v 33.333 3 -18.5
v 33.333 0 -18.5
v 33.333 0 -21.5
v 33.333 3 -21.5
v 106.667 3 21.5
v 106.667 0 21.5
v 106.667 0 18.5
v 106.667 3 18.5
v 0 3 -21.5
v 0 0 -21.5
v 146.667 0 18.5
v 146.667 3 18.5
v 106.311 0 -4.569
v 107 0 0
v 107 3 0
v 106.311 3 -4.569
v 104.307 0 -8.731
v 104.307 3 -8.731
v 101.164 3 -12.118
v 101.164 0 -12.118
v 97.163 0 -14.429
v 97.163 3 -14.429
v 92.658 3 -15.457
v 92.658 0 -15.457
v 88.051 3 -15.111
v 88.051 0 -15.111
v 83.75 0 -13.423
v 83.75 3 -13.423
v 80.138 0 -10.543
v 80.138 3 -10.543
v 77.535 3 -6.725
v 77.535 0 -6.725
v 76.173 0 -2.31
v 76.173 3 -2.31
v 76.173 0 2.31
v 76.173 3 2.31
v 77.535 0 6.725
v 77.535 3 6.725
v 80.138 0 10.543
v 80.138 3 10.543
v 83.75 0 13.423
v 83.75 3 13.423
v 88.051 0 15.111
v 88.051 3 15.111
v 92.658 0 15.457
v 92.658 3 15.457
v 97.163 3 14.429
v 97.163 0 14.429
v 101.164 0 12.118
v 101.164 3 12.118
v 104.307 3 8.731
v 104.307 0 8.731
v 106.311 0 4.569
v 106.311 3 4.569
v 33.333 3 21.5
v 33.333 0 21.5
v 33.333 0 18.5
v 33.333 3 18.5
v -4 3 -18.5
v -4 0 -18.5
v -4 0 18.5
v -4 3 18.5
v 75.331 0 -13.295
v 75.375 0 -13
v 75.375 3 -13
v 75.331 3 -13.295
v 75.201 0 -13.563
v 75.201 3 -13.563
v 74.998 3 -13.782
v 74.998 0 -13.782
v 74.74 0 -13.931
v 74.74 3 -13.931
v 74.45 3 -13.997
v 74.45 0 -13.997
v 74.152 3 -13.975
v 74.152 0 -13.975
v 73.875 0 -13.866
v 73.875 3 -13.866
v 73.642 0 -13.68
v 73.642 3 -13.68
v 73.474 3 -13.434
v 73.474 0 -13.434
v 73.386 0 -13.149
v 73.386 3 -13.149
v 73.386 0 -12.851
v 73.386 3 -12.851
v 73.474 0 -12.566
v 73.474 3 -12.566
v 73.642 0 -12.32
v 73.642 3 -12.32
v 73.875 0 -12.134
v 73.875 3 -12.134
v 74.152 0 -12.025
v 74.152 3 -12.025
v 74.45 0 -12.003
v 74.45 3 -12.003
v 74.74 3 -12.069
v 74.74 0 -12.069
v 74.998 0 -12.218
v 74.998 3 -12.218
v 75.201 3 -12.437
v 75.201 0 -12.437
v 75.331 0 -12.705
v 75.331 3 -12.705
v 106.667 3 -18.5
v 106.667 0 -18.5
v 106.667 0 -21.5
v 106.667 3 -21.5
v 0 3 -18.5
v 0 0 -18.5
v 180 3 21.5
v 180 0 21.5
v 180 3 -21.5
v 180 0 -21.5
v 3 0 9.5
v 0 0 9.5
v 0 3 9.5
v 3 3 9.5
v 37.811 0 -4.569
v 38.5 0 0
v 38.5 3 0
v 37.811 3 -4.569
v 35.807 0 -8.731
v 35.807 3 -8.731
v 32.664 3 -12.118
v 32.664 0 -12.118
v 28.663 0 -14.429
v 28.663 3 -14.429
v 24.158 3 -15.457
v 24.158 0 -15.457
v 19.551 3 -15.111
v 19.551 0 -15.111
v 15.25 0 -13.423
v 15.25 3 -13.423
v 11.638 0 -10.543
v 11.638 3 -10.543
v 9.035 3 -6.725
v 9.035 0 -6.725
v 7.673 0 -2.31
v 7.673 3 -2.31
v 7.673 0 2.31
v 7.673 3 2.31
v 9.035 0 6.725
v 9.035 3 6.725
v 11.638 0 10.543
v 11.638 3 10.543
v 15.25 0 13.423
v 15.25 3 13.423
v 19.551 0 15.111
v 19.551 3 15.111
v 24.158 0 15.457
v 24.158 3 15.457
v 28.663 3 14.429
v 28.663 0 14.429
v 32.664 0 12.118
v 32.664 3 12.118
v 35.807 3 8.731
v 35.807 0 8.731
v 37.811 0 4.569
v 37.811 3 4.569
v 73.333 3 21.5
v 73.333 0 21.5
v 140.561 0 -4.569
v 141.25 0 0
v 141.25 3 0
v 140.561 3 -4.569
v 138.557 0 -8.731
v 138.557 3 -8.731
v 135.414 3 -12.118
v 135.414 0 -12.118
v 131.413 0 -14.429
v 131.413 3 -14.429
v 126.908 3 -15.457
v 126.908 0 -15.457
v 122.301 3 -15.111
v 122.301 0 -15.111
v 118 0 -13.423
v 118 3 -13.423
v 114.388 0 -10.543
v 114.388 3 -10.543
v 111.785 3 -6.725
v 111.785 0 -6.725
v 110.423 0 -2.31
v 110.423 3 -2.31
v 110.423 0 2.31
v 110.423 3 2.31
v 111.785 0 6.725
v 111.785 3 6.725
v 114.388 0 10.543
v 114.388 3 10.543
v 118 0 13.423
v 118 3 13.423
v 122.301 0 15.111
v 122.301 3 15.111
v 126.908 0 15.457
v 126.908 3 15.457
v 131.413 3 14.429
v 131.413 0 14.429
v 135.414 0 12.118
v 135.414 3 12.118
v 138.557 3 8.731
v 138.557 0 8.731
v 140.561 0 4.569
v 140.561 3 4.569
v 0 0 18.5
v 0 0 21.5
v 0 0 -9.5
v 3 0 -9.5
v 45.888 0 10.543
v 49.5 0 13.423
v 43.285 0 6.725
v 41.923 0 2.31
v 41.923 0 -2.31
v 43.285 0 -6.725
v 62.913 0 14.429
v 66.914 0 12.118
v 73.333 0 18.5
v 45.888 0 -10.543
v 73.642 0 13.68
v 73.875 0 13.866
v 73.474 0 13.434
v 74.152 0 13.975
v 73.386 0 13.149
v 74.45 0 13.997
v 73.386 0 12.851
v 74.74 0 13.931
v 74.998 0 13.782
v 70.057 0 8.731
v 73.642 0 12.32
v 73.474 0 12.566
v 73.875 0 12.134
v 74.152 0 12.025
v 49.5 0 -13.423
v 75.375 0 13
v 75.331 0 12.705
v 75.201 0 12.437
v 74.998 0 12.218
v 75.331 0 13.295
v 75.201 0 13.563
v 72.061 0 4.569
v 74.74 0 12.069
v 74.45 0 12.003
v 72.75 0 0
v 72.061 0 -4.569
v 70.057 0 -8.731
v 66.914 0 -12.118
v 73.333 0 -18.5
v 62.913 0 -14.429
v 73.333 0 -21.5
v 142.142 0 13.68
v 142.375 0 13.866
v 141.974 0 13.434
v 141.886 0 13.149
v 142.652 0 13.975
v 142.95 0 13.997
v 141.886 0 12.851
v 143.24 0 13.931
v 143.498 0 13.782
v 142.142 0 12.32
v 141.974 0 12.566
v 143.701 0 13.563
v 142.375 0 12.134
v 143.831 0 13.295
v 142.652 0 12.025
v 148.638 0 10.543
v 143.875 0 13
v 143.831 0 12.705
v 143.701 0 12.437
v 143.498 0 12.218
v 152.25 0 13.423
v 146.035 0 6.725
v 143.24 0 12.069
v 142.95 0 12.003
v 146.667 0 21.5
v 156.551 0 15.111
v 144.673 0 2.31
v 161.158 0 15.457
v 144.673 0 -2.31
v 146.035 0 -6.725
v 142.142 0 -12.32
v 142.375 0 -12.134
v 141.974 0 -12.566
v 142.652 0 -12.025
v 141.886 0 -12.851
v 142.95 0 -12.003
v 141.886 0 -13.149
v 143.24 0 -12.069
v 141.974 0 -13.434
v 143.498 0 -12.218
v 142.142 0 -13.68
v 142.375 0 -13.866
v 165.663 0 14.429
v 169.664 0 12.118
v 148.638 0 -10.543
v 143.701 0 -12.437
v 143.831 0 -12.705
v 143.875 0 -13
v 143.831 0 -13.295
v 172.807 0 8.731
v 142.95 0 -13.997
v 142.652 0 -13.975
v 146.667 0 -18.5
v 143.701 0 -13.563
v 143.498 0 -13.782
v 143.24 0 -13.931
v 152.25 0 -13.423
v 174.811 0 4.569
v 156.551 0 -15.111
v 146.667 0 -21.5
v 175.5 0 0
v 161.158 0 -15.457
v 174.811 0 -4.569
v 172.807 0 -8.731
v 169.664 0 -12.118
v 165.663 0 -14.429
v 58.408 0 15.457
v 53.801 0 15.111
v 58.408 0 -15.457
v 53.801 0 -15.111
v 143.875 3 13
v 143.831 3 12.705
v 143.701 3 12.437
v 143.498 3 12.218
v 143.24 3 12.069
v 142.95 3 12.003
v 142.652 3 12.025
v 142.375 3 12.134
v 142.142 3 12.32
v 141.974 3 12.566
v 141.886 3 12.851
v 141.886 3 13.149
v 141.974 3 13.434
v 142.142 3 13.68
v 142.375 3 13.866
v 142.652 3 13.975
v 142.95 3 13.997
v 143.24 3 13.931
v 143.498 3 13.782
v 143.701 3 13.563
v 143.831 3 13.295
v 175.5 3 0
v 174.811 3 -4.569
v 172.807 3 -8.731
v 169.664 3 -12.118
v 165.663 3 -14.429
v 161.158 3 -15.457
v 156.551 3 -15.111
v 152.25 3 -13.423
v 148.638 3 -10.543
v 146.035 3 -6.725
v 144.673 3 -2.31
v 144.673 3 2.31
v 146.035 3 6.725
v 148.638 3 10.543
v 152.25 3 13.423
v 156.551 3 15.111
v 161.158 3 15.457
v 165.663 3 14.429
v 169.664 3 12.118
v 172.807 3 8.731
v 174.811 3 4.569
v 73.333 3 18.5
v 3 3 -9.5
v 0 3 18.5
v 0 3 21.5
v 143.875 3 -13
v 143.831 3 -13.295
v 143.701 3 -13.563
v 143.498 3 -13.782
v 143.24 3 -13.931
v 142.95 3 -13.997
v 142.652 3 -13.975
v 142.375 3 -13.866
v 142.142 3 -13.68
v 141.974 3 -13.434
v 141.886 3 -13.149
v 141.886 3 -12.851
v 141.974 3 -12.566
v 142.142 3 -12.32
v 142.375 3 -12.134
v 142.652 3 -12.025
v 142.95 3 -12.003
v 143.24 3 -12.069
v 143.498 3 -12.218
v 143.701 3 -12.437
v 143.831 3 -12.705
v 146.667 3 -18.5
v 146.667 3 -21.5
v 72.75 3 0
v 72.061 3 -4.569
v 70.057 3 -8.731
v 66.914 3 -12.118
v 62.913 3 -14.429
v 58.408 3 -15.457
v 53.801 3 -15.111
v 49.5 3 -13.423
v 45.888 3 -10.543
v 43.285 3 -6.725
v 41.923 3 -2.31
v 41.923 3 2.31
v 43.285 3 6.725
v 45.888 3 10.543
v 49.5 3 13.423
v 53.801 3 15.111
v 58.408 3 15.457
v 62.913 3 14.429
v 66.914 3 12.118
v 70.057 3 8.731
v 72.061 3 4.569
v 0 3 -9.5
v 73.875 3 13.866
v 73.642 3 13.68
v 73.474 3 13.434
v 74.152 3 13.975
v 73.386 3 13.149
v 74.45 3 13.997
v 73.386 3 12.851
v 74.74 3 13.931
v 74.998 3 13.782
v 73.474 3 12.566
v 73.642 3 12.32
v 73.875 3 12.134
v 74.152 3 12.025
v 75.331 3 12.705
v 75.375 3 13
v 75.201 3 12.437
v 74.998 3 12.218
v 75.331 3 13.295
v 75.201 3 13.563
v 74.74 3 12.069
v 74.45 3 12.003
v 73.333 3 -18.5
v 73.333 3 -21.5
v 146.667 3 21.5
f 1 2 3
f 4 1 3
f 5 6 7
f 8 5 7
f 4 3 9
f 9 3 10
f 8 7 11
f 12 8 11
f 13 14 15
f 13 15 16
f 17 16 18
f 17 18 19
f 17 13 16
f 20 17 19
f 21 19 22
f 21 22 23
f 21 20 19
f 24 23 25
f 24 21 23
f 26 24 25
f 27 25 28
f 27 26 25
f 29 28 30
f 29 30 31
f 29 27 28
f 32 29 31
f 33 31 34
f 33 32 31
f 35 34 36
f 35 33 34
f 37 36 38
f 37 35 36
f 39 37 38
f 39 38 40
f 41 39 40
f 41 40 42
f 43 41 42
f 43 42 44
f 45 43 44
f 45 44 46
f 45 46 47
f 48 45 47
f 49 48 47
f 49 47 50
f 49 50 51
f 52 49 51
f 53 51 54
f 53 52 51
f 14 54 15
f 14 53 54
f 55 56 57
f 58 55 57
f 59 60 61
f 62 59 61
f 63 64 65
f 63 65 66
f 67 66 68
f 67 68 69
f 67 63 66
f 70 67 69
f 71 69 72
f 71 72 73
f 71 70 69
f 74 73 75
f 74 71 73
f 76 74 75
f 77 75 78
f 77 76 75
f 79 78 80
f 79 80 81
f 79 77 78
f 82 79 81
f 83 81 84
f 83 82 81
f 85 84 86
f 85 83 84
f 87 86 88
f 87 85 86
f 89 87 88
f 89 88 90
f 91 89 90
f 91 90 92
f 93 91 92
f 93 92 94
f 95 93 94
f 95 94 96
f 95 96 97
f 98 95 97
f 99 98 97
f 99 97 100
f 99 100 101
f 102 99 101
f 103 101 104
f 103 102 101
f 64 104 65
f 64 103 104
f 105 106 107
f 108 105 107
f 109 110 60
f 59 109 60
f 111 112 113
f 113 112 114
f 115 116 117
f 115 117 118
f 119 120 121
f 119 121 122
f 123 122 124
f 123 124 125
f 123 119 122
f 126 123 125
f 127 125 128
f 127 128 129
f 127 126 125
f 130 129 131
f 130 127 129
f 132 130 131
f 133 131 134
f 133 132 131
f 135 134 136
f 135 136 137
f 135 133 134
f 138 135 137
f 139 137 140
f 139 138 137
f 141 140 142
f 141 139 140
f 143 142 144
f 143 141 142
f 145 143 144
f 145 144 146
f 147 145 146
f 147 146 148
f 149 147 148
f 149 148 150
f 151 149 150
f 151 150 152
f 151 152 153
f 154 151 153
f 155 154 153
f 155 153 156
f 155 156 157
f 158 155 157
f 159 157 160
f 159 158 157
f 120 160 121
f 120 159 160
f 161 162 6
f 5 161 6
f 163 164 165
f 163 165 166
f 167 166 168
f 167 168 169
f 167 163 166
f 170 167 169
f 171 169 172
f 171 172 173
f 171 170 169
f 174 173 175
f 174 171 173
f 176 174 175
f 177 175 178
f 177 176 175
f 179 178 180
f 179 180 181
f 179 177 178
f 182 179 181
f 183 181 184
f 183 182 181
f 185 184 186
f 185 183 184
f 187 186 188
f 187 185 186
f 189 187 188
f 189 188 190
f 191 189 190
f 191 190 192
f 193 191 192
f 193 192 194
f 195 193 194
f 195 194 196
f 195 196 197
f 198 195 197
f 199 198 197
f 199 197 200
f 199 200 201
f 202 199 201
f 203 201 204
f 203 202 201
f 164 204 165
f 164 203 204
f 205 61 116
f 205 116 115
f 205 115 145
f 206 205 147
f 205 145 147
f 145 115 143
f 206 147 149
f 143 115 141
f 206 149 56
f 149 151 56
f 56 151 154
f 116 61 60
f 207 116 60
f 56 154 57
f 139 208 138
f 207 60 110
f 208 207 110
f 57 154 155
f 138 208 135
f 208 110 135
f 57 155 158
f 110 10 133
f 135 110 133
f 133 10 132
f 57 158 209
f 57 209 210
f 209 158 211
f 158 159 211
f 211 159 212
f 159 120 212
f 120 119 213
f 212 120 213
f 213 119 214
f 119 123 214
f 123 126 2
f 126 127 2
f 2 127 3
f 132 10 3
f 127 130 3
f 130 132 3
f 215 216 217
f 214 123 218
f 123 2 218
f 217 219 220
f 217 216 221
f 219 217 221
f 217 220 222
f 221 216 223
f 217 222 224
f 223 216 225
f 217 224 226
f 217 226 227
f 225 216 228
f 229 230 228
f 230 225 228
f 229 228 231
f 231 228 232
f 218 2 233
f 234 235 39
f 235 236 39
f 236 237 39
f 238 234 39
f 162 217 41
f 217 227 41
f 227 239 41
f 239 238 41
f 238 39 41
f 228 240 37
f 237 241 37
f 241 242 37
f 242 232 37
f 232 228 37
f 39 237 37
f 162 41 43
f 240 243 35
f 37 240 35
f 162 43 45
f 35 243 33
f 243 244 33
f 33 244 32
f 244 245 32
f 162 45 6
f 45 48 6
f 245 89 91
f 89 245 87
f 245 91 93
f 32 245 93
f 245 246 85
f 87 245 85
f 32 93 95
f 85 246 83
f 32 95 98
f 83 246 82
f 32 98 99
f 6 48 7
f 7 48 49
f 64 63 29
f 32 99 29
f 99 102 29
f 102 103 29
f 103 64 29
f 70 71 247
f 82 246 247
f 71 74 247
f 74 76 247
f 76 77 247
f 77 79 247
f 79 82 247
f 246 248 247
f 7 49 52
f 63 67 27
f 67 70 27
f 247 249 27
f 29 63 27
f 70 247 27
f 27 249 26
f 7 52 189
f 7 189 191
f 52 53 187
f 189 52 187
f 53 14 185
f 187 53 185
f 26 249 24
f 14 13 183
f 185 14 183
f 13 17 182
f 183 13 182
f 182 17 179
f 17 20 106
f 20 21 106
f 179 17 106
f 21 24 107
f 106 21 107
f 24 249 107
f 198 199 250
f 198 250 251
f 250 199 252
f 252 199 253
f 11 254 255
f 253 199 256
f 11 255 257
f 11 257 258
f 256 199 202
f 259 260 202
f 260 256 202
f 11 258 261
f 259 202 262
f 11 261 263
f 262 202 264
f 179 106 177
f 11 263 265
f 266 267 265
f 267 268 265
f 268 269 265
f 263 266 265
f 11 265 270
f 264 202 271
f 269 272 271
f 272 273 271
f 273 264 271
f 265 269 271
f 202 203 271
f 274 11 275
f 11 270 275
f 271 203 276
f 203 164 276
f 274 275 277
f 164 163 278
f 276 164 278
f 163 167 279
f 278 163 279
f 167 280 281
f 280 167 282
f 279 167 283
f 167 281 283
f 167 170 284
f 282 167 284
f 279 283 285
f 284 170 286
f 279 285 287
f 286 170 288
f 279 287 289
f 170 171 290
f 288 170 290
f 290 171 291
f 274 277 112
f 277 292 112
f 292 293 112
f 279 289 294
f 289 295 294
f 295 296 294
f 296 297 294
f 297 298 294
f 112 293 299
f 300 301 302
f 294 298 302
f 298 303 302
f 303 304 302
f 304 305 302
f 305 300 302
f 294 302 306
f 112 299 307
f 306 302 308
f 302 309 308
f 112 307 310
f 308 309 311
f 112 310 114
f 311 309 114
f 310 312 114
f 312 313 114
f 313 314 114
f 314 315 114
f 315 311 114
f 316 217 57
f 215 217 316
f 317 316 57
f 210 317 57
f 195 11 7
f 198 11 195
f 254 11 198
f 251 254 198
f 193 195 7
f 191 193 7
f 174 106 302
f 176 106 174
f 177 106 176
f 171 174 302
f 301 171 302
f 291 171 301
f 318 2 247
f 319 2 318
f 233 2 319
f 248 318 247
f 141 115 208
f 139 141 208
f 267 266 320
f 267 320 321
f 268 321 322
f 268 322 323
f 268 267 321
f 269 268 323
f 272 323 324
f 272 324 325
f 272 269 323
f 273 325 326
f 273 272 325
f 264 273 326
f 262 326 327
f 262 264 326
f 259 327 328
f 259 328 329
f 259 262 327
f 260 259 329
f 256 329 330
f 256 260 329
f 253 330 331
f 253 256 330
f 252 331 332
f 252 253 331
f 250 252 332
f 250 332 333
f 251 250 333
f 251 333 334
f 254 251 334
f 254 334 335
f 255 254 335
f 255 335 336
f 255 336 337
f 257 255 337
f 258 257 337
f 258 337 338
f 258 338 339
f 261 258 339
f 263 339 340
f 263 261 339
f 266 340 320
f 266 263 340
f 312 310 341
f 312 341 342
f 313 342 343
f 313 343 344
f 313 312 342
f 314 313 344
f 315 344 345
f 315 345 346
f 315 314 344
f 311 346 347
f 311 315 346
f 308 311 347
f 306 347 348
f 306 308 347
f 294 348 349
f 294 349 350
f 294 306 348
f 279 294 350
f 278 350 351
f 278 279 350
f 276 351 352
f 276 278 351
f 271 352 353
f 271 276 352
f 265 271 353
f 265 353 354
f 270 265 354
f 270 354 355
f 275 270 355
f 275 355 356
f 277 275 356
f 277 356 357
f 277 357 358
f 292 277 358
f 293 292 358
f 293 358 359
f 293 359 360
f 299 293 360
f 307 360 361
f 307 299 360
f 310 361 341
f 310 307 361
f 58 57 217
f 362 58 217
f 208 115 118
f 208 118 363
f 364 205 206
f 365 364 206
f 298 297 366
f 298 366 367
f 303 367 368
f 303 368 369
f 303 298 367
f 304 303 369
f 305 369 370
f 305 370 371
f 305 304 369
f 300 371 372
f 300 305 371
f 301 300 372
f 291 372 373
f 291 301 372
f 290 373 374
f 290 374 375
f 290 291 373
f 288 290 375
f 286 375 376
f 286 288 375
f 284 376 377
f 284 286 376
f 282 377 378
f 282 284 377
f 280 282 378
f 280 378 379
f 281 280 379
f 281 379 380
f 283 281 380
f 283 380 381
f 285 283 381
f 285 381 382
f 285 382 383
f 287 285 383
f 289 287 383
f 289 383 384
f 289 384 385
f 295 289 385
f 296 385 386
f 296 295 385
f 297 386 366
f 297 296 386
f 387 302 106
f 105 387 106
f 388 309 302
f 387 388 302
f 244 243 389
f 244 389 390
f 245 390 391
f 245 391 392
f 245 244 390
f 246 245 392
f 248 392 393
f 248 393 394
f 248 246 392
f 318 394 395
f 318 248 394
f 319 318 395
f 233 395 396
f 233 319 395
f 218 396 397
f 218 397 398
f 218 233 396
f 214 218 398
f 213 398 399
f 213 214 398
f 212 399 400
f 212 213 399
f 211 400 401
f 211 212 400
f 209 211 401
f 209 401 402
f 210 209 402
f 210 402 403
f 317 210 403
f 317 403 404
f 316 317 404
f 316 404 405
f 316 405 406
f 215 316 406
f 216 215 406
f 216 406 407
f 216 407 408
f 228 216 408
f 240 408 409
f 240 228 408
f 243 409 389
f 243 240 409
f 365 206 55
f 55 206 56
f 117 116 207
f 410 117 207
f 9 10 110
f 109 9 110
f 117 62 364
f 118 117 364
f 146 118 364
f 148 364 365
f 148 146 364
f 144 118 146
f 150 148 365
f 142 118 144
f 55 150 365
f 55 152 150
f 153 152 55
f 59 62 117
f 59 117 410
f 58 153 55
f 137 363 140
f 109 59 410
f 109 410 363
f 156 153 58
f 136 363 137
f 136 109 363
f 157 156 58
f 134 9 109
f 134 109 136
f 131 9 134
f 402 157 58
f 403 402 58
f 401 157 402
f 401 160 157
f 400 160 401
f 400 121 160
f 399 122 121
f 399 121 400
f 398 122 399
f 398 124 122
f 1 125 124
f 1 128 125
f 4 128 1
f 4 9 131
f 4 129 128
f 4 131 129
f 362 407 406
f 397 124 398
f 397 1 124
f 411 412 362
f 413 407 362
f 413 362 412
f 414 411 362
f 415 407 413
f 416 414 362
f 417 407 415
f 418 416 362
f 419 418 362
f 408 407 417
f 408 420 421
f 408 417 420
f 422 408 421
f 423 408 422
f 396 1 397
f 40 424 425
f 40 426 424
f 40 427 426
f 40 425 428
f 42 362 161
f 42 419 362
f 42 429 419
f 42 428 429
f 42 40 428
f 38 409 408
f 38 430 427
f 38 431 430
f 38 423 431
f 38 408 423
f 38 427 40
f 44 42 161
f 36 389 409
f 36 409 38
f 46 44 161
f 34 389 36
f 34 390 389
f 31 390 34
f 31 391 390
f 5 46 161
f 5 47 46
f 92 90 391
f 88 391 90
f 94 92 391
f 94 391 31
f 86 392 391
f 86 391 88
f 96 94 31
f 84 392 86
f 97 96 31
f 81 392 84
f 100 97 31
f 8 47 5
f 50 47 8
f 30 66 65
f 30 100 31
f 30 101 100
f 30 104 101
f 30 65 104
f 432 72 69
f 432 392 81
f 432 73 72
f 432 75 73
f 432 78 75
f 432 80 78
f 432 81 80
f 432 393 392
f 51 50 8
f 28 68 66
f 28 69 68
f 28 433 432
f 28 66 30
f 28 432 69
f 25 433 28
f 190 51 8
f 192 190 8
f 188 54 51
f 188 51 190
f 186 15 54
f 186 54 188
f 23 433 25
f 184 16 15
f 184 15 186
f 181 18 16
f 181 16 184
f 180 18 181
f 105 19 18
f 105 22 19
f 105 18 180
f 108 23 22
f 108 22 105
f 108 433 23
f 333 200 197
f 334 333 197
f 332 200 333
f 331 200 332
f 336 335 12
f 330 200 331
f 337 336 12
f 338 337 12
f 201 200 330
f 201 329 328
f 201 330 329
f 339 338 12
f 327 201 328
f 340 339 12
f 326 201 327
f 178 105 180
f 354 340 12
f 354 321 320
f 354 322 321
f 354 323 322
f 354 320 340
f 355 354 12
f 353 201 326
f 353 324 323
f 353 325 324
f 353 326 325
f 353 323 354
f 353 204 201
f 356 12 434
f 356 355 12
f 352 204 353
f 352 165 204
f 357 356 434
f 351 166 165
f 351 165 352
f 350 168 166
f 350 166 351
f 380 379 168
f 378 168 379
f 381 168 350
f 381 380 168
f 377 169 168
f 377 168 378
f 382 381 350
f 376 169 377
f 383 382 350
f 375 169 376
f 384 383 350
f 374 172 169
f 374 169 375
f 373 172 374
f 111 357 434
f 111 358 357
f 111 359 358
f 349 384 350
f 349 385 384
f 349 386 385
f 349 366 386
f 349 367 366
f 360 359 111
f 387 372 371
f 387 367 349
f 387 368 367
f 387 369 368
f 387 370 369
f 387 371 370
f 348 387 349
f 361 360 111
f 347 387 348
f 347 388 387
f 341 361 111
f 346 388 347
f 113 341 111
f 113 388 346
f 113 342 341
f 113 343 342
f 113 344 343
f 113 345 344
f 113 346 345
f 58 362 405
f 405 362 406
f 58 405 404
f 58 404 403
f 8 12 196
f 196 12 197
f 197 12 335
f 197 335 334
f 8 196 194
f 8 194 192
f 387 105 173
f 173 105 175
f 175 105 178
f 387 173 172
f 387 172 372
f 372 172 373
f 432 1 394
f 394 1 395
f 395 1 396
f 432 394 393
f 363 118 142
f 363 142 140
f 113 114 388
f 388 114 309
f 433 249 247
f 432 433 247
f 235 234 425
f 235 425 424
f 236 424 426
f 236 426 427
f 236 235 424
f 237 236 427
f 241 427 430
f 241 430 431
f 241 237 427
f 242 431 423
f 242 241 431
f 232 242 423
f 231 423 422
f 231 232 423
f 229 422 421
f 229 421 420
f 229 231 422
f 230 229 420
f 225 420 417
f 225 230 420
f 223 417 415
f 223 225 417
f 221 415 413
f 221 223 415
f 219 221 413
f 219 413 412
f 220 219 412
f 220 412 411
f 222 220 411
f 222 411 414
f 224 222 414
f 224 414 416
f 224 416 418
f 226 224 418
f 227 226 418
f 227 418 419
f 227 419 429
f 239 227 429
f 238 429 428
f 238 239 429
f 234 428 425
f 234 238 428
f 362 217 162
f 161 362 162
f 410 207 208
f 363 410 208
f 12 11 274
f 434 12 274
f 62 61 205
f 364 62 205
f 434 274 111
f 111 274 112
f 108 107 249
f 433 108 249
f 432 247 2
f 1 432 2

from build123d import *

# Parameters (mm, degrees)
SKETCH1_W           = 3
SKETCH1_H           = 19
SKETCH1_R           = 1
SKETCH1_R_2         = 15.5
BOSS_EXTRUDE1_DEPTH = 3


with BuildPart() as part:
    # Sketch1 → Boss-Extrude1 (new body)
    with BuildSketch(Plane(origin=(0, 0, 0), x_dir=(1, 0, 0), z_dir=(0, 1, 0))):
        Polygon((33.333333333, 21.5), (0, 21.5), (0, 18.5), (-4, 18.5), (-4, -18.5), (0, -18.5), (0, -21.5), (33.333333333, -21.5), (33.333333333, -18.5), (73.333333333, -18.5), (73.333333333, -21.5), (106.666666667, -21.5), (106.666666667, -18.5), (146.666666667, -18.5), (146.666666667, -21.5), (180, -21.5), (180, 21.5), (146.666666667, 21.5), (146.666666667, 18.5), (106.666666667, 18.5), (106.666666667, 21.5), (73.333333333, 21.5), (73.333333333, 18.5), (33.333333333, 18.5), align=None)
        with Locations((1.5, 0)):
            Rectangle(SKETCH1_W, SKETCH1_H, mode=Mode.SUBTRACT)
        with Locations((74.375, -13)):
            Circle(SKETCH1_R, mode=Mode.SUBTRACT)
        with Locations((142.875, -13)):
            Circle(SKETCH1_R, mode=Mode.SUBTRACT)
        with Locations((23, 0)):
            Circle(SKETCH1_R_2, mode=Mode.SUBTRACT)
        with Locations((57.25, 0)):
            Circle(SKETCH1_R_2, mode=Mode.SUBTRACT)
        with Locations((74.375, 13)):
            Circle(SKETCH1_R, mode=Mode.SUBTRACT)
        with Locations((91.5, 0)):
            Circle(SKETCH1_R_2, mode=Mode.SUBTRACT)
        with Locations((125.75, 0)):
            Circle(SKETCH1_R_2, mode=Mode.SUBTRACT)
        with Locations((160, 0)):
            Circle(SKETCH1_R_2, mode=Mode.SUBTRACT)
        with Locations((142.875, 13)):
            Circle(SKETCH1_R, mode=Mode.SUBTRACT)
    extrude(amount=BOSS_EXTRUDE1_DEPTH)


solid = part.part
